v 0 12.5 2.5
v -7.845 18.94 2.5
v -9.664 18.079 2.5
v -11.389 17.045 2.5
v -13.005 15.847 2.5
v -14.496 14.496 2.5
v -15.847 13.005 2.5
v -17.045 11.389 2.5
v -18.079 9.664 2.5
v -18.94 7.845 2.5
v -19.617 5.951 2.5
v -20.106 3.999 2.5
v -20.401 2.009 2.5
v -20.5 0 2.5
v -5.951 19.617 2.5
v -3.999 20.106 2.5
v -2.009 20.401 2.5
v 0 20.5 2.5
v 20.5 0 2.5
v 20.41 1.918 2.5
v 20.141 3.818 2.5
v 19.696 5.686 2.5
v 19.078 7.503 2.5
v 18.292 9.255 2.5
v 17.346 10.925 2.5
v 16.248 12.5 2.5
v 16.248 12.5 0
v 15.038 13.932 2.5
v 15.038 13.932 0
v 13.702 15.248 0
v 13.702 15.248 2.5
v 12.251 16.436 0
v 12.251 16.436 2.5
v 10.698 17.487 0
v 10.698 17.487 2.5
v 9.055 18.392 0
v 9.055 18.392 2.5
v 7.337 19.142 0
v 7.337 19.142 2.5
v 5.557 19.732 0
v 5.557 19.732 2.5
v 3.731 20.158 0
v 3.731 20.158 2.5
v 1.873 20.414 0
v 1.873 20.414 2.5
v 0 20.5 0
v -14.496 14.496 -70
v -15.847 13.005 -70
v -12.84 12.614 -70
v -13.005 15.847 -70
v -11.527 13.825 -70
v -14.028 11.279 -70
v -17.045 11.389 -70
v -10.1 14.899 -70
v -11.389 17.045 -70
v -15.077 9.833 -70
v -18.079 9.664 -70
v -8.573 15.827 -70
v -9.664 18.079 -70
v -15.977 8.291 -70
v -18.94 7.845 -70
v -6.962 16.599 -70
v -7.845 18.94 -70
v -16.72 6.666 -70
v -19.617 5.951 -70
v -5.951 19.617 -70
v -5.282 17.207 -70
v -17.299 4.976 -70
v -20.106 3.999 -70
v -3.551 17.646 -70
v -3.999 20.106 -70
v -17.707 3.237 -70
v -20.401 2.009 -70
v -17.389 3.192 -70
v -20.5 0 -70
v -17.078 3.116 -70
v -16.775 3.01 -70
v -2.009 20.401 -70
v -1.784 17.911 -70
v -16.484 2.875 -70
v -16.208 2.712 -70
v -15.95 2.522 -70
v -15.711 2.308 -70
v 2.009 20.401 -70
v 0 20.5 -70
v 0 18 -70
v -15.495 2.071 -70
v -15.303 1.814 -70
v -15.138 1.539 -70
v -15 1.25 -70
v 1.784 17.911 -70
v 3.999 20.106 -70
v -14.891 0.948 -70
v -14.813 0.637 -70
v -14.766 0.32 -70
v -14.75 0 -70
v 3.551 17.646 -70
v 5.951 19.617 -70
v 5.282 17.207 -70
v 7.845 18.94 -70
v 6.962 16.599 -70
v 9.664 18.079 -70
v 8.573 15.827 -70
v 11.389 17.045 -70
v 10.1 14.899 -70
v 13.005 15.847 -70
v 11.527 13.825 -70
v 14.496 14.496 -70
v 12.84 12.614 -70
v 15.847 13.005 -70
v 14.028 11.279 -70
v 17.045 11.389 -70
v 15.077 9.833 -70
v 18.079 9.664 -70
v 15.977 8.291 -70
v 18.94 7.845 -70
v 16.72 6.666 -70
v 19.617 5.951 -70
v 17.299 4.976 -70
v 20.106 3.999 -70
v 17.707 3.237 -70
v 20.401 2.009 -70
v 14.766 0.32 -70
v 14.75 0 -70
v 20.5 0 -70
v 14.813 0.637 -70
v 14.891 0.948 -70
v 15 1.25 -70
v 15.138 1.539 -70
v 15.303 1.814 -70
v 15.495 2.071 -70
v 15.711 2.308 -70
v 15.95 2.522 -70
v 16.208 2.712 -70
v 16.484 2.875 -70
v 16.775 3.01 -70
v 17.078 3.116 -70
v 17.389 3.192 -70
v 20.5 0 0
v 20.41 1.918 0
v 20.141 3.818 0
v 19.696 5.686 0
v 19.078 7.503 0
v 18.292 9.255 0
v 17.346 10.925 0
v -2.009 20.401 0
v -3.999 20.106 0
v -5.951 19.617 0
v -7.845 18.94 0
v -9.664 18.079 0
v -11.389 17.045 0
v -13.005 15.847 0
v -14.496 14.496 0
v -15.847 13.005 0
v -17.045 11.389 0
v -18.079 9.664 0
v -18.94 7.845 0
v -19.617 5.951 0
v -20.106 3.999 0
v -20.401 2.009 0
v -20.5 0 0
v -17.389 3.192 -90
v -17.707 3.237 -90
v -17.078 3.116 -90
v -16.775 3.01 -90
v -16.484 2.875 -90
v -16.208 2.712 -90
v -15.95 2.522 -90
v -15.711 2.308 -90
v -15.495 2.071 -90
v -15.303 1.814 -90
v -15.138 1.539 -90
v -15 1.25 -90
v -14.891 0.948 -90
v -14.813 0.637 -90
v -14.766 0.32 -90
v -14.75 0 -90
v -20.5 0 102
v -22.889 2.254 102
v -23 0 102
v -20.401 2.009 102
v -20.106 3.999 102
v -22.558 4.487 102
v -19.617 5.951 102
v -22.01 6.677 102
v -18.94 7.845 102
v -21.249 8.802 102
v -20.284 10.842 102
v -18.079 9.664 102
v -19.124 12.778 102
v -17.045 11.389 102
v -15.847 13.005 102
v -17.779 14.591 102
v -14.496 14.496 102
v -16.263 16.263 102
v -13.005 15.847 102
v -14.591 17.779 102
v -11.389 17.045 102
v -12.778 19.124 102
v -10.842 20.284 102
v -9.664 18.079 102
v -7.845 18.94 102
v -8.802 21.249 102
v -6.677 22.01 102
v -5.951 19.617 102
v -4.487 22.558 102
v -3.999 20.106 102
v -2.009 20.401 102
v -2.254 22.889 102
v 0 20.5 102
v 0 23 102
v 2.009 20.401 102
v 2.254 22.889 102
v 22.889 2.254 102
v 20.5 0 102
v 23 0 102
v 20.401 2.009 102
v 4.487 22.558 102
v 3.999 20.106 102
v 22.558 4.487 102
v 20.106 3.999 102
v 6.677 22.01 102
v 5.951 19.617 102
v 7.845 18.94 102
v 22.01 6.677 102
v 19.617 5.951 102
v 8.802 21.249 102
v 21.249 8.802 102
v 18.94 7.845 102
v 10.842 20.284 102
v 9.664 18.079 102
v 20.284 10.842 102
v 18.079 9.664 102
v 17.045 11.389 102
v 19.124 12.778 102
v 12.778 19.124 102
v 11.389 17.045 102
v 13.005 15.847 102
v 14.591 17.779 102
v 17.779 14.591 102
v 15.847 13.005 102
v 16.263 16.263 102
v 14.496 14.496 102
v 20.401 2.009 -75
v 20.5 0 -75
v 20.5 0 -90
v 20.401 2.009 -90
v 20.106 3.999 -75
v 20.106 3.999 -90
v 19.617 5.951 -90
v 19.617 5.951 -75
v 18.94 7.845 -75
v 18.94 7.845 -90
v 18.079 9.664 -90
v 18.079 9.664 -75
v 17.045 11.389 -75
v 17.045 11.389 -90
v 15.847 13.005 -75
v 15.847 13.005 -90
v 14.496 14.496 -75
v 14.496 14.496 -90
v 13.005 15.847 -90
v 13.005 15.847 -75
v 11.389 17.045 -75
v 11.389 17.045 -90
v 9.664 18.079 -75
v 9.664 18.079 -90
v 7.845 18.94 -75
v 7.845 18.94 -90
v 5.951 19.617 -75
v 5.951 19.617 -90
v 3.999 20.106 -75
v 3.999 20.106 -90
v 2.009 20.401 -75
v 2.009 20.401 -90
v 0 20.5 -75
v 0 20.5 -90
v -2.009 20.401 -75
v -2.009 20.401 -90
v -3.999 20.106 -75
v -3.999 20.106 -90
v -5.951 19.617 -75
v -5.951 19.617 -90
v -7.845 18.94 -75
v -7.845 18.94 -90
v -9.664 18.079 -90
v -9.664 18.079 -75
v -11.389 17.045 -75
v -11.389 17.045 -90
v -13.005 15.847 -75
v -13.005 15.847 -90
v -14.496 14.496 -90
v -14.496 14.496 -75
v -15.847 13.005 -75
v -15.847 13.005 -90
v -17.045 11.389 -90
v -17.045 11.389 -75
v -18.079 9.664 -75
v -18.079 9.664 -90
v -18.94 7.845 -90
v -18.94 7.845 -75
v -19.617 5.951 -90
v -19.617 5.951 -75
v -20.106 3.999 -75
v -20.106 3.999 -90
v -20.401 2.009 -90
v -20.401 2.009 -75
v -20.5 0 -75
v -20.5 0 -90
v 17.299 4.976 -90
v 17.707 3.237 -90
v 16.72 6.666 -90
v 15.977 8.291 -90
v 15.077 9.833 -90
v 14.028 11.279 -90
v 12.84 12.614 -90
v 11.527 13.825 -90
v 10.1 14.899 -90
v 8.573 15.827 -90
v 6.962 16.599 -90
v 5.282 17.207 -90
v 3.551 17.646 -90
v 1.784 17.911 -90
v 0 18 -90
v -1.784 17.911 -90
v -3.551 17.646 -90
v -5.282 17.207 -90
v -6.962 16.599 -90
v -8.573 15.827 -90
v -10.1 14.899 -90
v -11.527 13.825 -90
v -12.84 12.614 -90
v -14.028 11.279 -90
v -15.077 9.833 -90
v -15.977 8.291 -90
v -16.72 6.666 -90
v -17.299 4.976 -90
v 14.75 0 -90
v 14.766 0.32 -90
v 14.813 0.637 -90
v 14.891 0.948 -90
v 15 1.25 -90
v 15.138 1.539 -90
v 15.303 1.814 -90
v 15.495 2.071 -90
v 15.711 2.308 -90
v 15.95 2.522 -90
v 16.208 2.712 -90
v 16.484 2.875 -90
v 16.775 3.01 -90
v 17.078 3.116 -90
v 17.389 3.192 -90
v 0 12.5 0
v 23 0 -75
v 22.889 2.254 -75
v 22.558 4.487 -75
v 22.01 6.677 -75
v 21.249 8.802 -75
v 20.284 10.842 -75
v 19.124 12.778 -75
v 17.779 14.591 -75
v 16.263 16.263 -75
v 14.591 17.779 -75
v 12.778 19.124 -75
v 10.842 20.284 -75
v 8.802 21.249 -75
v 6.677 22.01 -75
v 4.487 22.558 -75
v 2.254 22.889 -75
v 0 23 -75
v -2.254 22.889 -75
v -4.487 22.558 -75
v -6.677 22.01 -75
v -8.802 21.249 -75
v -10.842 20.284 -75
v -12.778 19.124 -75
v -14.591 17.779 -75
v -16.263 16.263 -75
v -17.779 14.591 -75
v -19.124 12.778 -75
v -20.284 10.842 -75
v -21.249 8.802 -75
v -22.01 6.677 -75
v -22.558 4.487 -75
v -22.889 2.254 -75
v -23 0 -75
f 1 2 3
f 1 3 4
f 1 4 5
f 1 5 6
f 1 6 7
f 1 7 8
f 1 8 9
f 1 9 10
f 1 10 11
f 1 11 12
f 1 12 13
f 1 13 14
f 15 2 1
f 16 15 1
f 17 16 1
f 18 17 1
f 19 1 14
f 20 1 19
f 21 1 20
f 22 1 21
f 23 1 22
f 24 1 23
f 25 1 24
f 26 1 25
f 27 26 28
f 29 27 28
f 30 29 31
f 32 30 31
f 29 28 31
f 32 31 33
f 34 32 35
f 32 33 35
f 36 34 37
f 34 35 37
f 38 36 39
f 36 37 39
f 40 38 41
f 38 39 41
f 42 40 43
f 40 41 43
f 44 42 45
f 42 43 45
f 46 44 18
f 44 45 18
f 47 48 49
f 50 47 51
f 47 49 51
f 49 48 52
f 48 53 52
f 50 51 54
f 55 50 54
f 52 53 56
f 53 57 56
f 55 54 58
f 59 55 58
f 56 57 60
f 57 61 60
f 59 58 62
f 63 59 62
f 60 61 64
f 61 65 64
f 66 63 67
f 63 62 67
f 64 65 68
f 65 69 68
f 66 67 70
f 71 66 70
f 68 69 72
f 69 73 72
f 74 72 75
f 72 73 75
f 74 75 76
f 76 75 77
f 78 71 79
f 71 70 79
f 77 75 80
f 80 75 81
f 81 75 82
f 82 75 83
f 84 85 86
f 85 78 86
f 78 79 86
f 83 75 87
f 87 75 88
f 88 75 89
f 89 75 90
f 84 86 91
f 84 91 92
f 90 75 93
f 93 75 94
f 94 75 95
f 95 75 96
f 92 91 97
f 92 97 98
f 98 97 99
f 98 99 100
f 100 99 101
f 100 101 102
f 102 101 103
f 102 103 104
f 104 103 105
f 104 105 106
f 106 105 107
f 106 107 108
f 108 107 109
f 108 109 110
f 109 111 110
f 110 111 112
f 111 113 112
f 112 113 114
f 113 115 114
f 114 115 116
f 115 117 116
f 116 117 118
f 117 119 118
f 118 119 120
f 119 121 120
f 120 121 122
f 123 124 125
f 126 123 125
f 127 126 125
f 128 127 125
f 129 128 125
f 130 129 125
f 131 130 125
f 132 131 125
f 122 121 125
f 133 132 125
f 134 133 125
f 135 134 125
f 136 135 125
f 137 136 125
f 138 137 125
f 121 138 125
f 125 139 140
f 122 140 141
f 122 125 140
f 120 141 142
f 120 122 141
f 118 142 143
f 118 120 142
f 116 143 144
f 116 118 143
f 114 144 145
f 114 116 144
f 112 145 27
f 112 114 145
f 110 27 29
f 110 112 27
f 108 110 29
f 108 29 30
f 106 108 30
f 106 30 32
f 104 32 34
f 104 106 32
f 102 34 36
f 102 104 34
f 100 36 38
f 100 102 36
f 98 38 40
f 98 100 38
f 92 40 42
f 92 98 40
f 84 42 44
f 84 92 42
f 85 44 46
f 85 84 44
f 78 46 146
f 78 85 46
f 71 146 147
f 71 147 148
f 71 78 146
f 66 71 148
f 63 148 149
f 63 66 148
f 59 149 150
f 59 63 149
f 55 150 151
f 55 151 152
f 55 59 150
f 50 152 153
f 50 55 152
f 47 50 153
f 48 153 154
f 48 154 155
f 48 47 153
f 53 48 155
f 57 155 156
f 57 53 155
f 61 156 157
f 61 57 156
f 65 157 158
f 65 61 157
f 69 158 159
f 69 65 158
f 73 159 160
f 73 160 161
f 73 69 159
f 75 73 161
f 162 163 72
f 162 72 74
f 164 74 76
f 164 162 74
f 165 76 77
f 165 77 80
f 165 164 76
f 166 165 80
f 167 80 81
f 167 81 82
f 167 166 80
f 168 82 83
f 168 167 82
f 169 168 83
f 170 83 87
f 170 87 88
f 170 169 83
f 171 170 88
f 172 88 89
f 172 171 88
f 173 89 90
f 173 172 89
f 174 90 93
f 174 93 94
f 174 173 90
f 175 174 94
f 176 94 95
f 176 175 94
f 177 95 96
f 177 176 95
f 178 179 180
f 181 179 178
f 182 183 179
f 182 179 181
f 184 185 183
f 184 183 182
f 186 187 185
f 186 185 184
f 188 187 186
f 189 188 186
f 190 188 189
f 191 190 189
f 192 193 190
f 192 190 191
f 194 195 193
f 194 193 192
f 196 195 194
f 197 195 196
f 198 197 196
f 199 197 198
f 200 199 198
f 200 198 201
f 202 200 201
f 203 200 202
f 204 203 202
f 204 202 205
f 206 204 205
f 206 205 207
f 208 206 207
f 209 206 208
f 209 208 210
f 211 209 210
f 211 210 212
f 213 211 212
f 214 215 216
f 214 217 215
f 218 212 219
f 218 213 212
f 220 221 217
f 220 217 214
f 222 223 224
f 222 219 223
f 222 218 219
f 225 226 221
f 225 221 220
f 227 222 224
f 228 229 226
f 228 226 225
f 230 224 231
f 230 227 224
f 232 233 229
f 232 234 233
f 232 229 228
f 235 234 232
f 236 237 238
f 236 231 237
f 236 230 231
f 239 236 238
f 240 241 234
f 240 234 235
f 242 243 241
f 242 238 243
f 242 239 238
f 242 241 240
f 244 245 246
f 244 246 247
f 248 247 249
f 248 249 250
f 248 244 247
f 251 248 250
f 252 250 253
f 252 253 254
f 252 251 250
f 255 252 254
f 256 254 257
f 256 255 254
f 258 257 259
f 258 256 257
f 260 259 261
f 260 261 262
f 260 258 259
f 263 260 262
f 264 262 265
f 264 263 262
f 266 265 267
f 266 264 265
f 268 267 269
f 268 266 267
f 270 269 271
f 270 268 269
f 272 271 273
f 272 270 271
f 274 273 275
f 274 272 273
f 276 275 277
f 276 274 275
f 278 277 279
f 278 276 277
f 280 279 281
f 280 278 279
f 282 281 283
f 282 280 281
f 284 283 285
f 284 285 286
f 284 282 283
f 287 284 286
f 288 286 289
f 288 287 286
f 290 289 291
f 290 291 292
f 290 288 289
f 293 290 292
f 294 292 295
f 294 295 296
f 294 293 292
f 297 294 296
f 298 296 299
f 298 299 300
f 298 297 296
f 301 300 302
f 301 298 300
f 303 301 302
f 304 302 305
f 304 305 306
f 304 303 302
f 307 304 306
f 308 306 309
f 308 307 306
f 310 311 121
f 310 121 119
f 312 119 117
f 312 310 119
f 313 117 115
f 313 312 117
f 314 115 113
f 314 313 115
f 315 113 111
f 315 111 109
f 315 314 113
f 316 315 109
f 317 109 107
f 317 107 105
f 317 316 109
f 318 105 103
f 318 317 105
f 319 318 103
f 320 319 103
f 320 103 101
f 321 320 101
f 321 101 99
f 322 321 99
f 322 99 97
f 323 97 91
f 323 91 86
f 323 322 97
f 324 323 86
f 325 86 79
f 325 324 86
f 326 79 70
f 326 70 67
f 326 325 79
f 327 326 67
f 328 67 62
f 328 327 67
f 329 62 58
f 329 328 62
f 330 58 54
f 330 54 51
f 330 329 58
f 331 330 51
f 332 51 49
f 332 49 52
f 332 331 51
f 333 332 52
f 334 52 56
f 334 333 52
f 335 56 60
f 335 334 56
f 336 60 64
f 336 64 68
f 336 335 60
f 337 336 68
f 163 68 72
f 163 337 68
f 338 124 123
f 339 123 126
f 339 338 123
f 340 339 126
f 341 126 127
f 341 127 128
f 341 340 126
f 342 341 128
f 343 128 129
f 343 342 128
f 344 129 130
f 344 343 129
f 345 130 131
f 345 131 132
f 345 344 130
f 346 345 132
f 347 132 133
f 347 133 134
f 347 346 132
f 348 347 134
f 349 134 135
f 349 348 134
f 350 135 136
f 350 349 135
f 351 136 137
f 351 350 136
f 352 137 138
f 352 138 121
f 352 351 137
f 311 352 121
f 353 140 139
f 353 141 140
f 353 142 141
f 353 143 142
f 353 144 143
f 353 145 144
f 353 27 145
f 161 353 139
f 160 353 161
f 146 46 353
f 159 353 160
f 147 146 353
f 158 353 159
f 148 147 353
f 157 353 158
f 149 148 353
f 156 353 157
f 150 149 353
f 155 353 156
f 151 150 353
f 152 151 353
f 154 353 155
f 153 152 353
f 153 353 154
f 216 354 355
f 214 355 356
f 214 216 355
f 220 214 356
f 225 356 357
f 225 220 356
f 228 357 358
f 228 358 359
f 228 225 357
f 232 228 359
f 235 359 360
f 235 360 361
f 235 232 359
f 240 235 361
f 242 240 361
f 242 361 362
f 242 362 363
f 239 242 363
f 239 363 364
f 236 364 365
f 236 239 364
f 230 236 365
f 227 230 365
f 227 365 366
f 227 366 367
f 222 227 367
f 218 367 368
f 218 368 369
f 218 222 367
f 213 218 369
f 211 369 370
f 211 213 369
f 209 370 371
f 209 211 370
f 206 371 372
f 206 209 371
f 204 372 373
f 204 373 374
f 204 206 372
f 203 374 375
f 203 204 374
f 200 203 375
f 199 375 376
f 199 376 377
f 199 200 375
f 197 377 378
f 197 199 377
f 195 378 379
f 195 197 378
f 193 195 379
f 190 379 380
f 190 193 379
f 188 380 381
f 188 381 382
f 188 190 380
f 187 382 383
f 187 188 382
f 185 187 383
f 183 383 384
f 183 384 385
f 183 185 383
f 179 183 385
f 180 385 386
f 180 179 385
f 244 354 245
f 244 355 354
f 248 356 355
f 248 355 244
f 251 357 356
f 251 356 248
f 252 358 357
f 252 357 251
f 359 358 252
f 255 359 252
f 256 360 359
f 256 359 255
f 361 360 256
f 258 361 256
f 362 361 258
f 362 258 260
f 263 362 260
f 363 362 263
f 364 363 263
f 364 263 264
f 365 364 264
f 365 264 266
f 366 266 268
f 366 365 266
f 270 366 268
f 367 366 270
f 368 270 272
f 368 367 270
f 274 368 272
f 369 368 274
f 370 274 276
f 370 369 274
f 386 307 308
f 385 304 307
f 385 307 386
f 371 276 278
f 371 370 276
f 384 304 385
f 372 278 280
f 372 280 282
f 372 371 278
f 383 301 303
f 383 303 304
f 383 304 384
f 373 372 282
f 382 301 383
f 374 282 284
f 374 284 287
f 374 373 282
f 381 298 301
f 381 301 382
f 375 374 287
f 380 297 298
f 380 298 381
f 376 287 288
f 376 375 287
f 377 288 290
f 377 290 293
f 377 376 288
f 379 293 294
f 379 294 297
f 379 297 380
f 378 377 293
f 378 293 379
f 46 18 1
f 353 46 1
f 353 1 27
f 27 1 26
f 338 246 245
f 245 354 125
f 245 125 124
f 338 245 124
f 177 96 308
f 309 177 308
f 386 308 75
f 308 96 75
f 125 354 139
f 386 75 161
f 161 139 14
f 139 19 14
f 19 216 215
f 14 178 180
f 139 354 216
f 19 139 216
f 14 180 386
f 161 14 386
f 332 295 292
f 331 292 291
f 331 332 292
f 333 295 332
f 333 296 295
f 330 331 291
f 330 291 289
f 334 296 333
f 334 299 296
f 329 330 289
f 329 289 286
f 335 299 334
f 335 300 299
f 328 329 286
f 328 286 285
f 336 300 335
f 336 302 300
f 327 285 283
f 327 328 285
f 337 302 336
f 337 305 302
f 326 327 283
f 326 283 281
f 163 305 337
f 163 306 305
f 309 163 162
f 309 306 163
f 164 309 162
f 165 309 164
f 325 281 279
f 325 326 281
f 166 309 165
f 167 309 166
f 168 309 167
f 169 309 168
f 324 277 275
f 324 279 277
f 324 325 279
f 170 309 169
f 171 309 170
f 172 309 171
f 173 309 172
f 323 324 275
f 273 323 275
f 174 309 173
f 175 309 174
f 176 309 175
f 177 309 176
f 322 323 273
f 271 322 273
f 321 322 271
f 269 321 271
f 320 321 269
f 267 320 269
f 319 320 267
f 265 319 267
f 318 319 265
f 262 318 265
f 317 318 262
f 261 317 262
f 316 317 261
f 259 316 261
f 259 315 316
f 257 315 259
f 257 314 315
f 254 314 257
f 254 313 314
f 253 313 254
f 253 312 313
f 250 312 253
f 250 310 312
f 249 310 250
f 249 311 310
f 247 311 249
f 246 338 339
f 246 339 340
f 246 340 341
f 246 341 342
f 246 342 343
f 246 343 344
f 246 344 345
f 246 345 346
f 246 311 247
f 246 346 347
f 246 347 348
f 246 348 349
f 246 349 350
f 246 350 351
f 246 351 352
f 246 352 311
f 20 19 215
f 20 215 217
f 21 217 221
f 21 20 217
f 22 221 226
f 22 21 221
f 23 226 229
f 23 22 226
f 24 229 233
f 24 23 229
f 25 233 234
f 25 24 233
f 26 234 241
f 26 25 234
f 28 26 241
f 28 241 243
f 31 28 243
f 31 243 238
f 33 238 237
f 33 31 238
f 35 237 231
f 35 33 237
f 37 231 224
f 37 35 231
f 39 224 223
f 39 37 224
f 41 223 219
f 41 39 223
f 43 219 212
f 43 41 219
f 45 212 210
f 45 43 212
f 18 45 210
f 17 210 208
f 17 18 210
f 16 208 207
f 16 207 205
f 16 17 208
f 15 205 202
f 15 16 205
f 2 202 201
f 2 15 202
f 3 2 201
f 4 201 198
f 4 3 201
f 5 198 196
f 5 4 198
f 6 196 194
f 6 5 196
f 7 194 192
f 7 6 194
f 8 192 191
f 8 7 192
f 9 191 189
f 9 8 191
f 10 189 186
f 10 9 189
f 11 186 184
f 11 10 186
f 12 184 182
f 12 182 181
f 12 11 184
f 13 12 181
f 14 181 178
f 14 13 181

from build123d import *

# Parameters (mm, degrees)
F3_DEPTH = 2.5
F5_DEPTH = 20
F7_DEPTH = 192.001


with BuildPart() as f1:
    # F0 (on Front) → F1 (revolve)
    with BuildSketch(Plane.XZ):
        Polygon((20.5, 2.5), (0, 2.5), (0, 0), (20.5, 0), (20.5, -70), (18, -70), (18, -90), (20.5, -90), (20.5, -75), (23, -75), (23, 0), (23, 102), (20.5, 102), align=None)
    revolve(axis=Axis((0, 0, 1.25), (0, 0, 1)))

    # F2 (on face) → F3 (cut, through all)
    with BuildSketch(Plane.XY.offset(2.5)):
        with BuildLine():
            Line((0, 12.5), (16.248077, 12.5))
            ThreePointArc((16.248077, 12.5), (9.055385, 18.391574), (0, 20.5))
            Line((0, 20.5), (0, 12.5))
        make_face()
    extrude(amount=-F3_DEPTH, mode=Mode.SUBTRACT)

    # F4 (on face) → F5 (join, through all)
    with BuildSketch(Plane(origin=(0, 0, -90), x_dir=(1, 0, 0), z_dir=(0, 0, -1))):
        with BuildLine():
            ThreePointArc((-17.706597, 3.236729), (-18, 0), (-17.706597, -3.236729))
            ThreePointArc((-17.706597, -3.236729), (-14.75, 0), (-17.706597, 3.236729))
        make_face()
        with BuildLine():
            ThreePointArc((17.706597, -3.236729), (18, 0), (17.706597, 3.236729))
            ThreePointArc((17.706597, 3.236729), (14.75, 0), (17.706597, -3.236729))
        make_face()
    extrude(amount=-F5_DEPTH)

    # F6 (on face) → F7 (cut, through all)
    with BuildSketch(Plane.XY.offset(102)):
        with BuildLine():
            Line((23, 0), (-23, 0))
            ThreePointArc((-23, 0), (0, -23), (23, 0))
        make_face()
    extrude(amount=-F7_DEPTH, mode=Mode.SUBTRACT)


solid = f1.part
